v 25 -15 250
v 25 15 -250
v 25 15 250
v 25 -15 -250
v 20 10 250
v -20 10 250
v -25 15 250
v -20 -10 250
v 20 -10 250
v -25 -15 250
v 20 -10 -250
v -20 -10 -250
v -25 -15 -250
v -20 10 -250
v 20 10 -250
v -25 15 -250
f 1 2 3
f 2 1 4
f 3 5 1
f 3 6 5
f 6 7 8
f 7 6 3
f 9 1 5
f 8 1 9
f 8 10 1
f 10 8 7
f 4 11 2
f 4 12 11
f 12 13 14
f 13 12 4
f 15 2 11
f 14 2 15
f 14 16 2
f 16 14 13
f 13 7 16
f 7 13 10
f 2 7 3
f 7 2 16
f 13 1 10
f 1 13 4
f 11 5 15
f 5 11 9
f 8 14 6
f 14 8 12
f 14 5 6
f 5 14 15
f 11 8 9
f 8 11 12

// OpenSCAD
module beam_hollow_rectangular(L, w, d, t, suppress_shopping_outputs = false) {
    difference() {
        cube([w, d, L], center = true);
        cube([w - t * 2, d - t * 2, L], center = true);
    }
    // Shopping
    if (!suppress_shopping_outputs) {
        echo(str("Rectangular Aluminium hollow beam: Rectangular Aluminium hollow beam ", L, "mm x ", w, "mm x ", d, "mm x ", t, "mm - x1"));
    }
}

beam_hollow_rectangular(500, 50, 30, 5);
